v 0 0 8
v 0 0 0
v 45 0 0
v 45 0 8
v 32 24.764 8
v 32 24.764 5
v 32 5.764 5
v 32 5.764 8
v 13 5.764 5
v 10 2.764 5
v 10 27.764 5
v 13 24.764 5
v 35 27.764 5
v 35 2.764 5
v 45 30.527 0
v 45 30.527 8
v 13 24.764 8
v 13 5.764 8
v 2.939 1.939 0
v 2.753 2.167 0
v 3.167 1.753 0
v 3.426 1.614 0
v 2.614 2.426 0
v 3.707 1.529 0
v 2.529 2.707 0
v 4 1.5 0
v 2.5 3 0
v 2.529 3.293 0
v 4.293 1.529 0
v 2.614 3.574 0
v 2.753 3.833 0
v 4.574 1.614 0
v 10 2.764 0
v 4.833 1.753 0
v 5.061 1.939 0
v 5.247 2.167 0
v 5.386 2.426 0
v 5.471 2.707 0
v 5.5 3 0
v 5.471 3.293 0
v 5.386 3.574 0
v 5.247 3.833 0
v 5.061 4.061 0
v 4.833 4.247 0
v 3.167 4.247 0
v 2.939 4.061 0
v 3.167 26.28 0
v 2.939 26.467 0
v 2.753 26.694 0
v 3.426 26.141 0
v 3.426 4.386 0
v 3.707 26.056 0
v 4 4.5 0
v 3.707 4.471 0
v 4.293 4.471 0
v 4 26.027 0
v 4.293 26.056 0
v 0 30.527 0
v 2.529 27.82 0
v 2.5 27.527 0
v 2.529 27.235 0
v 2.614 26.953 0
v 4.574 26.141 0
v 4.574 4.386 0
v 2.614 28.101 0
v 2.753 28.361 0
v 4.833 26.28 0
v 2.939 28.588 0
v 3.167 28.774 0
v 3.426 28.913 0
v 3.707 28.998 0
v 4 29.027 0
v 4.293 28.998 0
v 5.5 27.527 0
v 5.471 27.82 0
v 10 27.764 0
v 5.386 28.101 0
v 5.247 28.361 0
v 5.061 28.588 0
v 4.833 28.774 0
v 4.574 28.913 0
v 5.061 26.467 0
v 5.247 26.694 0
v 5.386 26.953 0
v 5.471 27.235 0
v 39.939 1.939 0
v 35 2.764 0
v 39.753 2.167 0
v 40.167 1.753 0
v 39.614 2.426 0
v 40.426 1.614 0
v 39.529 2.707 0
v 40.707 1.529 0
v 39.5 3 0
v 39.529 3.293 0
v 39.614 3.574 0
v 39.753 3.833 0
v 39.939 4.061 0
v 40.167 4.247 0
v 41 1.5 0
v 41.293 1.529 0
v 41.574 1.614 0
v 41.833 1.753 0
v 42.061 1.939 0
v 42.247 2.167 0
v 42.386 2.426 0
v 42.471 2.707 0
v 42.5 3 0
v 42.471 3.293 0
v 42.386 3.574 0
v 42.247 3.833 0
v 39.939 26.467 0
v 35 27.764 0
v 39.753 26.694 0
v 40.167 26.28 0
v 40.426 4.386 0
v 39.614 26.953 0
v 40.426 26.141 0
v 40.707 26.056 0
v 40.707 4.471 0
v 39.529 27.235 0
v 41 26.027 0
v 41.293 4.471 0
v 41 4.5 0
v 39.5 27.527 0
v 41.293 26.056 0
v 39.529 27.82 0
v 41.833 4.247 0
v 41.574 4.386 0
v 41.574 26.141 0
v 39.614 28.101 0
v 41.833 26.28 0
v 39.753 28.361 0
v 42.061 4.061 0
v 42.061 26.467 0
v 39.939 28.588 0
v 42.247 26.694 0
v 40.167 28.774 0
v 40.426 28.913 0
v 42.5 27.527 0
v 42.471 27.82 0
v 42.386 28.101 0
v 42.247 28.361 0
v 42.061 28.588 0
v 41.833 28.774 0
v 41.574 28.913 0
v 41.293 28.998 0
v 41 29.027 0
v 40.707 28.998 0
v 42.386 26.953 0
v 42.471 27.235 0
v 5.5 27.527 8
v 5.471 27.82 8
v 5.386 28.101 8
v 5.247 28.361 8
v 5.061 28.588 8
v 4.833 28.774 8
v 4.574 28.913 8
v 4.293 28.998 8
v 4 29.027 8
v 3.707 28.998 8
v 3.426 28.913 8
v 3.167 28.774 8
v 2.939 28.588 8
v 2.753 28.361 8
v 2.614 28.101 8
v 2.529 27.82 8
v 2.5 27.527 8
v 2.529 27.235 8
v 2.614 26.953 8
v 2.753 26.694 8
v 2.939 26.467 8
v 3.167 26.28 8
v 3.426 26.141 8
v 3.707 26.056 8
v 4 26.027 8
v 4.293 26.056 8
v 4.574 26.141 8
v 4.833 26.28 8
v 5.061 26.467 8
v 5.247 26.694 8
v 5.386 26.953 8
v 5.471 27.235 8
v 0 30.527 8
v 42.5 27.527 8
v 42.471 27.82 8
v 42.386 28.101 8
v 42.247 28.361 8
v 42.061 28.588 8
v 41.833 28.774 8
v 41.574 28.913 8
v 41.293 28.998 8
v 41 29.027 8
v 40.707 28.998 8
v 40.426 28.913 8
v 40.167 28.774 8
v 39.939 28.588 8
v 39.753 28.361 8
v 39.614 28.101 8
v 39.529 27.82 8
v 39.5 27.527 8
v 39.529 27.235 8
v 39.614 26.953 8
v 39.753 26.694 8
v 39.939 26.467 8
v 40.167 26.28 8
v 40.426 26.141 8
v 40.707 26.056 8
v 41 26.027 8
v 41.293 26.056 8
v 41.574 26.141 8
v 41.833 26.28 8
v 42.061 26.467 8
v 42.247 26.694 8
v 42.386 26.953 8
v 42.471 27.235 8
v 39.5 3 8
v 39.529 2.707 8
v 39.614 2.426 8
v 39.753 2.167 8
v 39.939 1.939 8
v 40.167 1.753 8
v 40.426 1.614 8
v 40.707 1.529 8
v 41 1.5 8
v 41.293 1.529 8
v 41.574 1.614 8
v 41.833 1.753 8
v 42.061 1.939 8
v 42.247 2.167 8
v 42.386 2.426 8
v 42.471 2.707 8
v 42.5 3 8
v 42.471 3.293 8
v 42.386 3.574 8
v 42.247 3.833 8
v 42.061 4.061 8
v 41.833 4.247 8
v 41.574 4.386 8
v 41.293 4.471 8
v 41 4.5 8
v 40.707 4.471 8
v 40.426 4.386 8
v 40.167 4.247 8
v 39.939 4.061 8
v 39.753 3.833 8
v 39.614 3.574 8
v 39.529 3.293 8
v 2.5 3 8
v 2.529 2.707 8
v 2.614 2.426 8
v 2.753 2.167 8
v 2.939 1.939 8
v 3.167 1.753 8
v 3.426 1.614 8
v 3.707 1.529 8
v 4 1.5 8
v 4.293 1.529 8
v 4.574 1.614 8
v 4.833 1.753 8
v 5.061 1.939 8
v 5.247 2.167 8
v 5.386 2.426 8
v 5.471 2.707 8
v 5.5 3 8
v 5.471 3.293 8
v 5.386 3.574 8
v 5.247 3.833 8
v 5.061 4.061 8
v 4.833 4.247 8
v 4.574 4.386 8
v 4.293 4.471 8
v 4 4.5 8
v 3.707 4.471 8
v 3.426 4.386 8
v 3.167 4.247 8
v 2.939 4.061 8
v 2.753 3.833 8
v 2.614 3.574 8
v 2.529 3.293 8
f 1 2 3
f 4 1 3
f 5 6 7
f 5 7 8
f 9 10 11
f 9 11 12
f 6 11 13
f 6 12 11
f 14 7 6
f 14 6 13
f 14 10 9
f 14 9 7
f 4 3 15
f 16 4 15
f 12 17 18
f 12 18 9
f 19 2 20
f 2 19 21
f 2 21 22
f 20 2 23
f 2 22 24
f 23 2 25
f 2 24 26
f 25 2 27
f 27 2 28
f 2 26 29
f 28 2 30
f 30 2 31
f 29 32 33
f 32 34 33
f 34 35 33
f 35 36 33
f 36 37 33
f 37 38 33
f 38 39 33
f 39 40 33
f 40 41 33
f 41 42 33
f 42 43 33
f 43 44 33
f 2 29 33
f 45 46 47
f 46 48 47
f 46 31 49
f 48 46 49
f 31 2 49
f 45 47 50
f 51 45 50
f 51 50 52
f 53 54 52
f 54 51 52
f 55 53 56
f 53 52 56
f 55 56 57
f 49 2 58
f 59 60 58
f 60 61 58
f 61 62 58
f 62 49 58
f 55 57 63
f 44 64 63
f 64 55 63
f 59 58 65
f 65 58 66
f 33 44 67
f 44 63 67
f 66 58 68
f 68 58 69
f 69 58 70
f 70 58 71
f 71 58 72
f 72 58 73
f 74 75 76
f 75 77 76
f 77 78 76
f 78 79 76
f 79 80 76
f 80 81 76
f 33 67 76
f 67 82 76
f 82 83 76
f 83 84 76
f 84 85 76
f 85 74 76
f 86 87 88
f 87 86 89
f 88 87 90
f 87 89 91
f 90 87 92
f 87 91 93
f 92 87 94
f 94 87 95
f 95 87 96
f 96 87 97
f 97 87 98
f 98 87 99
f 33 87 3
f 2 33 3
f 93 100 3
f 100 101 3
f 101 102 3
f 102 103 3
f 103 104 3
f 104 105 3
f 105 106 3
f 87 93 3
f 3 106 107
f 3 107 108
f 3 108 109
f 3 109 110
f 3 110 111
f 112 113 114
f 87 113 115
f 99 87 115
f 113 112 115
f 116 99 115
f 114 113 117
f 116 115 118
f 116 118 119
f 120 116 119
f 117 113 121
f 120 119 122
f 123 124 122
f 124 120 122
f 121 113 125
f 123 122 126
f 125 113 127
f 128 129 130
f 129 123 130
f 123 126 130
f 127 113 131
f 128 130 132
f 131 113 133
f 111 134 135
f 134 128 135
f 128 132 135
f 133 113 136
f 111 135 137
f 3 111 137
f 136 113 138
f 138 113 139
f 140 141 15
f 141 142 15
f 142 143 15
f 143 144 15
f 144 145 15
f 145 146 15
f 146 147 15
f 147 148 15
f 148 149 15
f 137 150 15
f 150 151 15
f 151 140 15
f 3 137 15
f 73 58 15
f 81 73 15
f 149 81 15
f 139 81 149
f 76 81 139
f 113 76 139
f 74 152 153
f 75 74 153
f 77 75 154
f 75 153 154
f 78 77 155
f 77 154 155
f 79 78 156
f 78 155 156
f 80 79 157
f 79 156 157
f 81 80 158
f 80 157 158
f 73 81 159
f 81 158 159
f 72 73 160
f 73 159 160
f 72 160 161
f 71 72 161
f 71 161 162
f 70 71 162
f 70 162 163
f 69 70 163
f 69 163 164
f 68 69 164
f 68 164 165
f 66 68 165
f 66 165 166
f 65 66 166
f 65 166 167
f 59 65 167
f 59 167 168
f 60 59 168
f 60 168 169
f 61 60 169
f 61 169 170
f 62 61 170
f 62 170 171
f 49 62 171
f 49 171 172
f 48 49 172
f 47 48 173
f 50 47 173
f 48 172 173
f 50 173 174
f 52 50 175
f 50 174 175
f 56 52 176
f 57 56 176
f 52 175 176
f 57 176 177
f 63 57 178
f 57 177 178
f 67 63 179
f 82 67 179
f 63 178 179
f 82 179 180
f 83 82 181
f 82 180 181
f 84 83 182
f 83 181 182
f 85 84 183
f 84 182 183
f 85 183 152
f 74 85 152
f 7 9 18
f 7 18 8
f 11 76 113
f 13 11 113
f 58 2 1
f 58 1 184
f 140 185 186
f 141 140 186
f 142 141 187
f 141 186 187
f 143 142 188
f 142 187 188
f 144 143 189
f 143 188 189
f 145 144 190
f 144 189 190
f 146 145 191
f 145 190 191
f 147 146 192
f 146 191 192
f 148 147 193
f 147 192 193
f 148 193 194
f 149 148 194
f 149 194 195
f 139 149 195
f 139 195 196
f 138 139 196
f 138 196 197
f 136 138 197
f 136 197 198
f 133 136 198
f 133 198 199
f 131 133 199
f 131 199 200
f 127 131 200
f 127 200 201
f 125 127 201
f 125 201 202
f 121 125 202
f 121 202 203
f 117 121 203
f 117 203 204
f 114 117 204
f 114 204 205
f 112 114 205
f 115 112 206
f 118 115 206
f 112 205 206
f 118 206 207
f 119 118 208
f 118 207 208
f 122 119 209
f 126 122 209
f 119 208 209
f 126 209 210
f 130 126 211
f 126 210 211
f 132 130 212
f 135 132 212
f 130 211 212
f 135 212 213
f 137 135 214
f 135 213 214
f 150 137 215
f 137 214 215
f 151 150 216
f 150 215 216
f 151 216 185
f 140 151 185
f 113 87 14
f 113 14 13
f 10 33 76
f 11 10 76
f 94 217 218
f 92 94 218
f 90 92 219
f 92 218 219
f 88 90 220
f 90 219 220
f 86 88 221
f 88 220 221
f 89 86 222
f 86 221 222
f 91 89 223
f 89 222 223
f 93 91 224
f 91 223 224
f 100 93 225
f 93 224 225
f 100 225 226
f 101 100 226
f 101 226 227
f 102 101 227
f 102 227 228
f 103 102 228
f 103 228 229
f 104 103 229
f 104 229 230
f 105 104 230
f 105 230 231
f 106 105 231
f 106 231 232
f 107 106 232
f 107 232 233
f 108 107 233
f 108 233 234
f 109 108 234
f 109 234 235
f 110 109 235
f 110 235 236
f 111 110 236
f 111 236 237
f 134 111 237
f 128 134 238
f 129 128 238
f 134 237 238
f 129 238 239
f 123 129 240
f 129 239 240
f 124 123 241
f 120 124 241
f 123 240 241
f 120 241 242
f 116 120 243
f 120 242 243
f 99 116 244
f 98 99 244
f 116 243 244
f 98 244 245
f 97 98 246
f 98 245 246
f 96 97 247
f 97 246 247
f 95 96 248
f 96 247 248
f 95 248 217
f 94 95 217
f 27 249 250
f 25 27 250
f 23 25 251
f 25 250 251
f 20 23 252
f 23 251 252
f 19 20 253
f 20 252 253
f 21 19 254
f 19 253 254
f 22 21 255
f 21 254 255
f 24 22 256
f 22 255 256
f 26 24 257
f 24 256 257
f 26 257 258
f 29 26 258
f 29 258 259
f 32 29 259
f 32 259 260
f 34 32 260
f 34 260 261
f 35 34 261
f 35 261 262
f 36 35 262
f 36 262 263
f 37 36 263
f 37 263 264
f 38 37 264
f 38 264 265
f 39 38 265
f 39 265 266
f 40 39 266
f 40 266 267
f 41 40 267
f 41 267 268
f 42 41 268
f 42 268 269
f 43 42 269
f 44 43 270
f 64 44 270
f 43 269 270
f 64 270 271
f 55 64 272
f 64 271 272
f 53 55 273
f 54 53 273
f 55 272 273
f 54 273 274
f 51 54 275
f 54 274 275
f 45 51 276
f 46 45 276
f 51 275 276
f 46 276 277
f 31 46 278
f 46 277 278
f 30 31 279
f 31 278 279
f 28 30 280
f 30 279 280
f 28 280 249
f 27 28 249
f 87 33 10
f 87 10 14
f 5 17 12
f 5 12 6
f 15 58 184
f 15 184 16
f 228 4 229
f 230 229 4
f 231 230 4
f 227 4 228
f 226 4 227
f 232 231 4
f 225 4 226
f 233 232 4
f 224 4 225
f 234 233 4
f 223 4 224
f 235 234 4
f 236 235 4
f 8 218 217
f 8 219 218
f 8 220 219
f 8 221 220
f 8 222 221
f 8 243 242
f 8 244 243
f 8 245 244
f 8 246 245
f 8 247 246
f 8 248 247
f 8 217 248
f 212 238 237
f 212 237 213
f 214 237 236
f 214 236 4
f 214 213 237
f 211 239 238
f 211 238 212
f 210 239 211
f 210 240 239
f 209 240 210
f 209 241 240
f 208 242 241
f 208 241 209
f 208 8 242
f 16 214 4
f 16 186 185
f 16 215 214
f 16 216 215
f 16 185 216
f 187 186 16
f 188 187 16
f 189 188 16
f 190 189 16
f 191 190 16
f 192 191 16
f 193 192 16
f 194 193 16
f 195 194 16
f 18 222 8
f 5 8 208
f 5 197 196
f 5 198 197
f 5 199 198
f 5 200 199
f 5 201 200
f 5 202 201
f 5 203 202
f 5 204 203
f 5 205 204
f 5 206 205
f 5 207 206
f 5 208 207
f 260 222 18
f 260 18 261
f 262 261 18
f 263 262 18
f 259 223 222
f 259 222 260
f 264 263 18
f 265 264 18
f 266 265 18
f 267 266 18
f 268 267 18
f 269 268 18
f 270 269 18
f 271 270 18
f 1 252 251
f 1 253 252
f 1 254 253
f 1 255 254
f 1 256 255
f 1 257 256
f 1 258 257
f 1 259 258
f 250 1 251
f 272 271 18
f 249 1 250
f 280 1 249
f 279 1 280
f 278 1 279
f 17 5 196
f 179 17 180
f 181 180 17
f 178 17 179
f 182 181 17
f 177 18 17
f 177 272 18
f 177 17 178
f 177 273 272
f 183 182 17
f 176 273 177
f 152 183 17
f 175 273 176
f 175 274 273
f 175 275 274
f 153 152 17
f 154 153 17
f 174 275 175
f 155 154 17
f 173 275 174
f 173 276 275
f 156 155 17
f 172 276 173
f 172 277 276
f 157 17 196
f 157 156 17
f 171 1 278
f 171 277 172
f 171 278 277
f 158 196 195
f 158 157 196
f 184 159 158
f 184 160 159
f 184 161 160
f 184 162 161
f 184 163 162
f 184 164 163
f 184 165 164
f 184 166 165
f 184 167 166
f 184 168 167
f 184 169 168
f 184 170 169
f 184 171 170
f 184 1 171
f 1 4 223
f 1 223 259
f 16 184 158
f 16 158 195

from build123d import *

# Parameters (mm, degrees)
SKETCH1_W               = 45
SKETCH1_H               = 30.527185319
SKETCH1_W_2             = 25
SKETCH1_H_2             = 25
BOSS_EXTRUDE1_DEPTH     = 10
SKETCH2_W               = 5
SKETCH2_H               = 25
BOSS_EXTRUDE2_DEPTH     = 3
SKETCH3_W               = 5
SKETCH3_H               = 25
BOSS_EXTRUDE3_DEPTH     = 3
SKETCH4_W               = 19
SKETCH4_H               = 5
BOSS_EXTRUDE4_DEPTH     = 3
SKETCH5_W               = 19
SKETCH5_H               = 5
BOSS_EXTRUDE5_DEPTH     = 3
SKETCH6_R               = 1.5
CUT_EXTRUDE1_DEPTH      = 56.289321243
CUT_EXTRUDE2_DEPTH      = 56.289321243
CUT_EXTRUDE2_DEPTH_BACK = 56.289321243
SKETCH7_W               = 2
SKETCH7_H               = 30.527185319


with BuildPart() as part:
    # Sketch1 → Boss-Extrude1 (new body)
    with BuildSketch(Plane.XY):
        with Locations((22.5, 15.26359266)):
            Rectangle(SKETCH1_W, SKETCH1_H)
        with Locations((22.5, 15.26359266)):
            Rectangle(SKETCH1_W_2, SKETCH1_H_2, mode=Mode.SUBTRACT)
    extrude(amount=BOSS_EXTRUDE1_DEPTH)

    # Sketch2 → Boss-Extrude2 (add)
    with BuildSketch(Plane(origin=(10, 0, 0), x_dir=(0, 0, -1), z_dir=(1, 0, 0))):
        with Locations((-7.5, 15.26359266)):
            Rectangle(SKETCH2_W, SKETCH2_H)
    extrude(amount=BOSS_EXTRUDE2_DEPTH)

    # Sketch3 → Boss-Extrude3 (add)
    with BuildSketch(Plane.ZY.offset(-35)):
        with Locations((7.5, 15.26359266)):
            Rectangle(SKETCH3_W, SKETCH3_H)
    extrude(amount=BOSS_EXTRUDE3_DEPTH)

    # Sketch4 → Boss-Extrude4 (add)
    with BuildSketch(Plane.XZ.offset(-27.76359266)):
        with Locations((22.5, 7.5)):
            Rectangle(SKETCH4_W, SKETCH4_H)
    extrude(amount=BOSS_EXTRUDE4_DEPTH)

    # Sketch5 → Boss-Extrude5 (add)
    with BuildSketch(Plane(origin=(0, 2.76359266, 0), x_dir=(1, 0, 0), z_dir=(0, 1, 0))):
        with Locations((22.5, -7.5)):
            Rectangle(SKETCH5_W, SKETCH5_H)
    extrude(amount=BOSS_EXTRUDE5_DEPTH)

    # Sketch6 → Cut-Extrude1 (cut, through all)
    with BuildSketch(Plane.XY.offset(10)):
        with Locations((4, 27.527185319)):
            Circle(SKETCH6_R)
        with Locations((41, 27.527185319)):
            Circle(SKETCH6_R)
        with Locations(Location((41, 3, 0), (0, 0, 180))):
            Circle(SKETCH6_R)
        with Locations(Location((4, 3, 0), (0, 0, 180))):
            Circle(SKETCH6_R)
    extrude(amount=-CUT_EXTRUDE1_DEPTH, mode=Mode.SUBTRACT)

    # Sketch7 → Cut-Extrude2 (cut, two sides: drawn at the far end of the back side and taken through both)
    with BuildSketch(Plane(origin=(45, 0, 0), x_dir=(0, 0, -1), z_dir=(1, 0, 0)).offset(-CUT_EXTRUDE2_DEPTH_BACK)):
        with Locations((-9, 15.26359266)):
            Rectangle(SKETCH7_W, SKETCH7_H)
    extrude(amount=CUT_EXTRUDE2_DEPTH + CUT_EXTRUDE2_DEPTH_BACK, mode=Mode.SUBTRACT)


solid = part.part
